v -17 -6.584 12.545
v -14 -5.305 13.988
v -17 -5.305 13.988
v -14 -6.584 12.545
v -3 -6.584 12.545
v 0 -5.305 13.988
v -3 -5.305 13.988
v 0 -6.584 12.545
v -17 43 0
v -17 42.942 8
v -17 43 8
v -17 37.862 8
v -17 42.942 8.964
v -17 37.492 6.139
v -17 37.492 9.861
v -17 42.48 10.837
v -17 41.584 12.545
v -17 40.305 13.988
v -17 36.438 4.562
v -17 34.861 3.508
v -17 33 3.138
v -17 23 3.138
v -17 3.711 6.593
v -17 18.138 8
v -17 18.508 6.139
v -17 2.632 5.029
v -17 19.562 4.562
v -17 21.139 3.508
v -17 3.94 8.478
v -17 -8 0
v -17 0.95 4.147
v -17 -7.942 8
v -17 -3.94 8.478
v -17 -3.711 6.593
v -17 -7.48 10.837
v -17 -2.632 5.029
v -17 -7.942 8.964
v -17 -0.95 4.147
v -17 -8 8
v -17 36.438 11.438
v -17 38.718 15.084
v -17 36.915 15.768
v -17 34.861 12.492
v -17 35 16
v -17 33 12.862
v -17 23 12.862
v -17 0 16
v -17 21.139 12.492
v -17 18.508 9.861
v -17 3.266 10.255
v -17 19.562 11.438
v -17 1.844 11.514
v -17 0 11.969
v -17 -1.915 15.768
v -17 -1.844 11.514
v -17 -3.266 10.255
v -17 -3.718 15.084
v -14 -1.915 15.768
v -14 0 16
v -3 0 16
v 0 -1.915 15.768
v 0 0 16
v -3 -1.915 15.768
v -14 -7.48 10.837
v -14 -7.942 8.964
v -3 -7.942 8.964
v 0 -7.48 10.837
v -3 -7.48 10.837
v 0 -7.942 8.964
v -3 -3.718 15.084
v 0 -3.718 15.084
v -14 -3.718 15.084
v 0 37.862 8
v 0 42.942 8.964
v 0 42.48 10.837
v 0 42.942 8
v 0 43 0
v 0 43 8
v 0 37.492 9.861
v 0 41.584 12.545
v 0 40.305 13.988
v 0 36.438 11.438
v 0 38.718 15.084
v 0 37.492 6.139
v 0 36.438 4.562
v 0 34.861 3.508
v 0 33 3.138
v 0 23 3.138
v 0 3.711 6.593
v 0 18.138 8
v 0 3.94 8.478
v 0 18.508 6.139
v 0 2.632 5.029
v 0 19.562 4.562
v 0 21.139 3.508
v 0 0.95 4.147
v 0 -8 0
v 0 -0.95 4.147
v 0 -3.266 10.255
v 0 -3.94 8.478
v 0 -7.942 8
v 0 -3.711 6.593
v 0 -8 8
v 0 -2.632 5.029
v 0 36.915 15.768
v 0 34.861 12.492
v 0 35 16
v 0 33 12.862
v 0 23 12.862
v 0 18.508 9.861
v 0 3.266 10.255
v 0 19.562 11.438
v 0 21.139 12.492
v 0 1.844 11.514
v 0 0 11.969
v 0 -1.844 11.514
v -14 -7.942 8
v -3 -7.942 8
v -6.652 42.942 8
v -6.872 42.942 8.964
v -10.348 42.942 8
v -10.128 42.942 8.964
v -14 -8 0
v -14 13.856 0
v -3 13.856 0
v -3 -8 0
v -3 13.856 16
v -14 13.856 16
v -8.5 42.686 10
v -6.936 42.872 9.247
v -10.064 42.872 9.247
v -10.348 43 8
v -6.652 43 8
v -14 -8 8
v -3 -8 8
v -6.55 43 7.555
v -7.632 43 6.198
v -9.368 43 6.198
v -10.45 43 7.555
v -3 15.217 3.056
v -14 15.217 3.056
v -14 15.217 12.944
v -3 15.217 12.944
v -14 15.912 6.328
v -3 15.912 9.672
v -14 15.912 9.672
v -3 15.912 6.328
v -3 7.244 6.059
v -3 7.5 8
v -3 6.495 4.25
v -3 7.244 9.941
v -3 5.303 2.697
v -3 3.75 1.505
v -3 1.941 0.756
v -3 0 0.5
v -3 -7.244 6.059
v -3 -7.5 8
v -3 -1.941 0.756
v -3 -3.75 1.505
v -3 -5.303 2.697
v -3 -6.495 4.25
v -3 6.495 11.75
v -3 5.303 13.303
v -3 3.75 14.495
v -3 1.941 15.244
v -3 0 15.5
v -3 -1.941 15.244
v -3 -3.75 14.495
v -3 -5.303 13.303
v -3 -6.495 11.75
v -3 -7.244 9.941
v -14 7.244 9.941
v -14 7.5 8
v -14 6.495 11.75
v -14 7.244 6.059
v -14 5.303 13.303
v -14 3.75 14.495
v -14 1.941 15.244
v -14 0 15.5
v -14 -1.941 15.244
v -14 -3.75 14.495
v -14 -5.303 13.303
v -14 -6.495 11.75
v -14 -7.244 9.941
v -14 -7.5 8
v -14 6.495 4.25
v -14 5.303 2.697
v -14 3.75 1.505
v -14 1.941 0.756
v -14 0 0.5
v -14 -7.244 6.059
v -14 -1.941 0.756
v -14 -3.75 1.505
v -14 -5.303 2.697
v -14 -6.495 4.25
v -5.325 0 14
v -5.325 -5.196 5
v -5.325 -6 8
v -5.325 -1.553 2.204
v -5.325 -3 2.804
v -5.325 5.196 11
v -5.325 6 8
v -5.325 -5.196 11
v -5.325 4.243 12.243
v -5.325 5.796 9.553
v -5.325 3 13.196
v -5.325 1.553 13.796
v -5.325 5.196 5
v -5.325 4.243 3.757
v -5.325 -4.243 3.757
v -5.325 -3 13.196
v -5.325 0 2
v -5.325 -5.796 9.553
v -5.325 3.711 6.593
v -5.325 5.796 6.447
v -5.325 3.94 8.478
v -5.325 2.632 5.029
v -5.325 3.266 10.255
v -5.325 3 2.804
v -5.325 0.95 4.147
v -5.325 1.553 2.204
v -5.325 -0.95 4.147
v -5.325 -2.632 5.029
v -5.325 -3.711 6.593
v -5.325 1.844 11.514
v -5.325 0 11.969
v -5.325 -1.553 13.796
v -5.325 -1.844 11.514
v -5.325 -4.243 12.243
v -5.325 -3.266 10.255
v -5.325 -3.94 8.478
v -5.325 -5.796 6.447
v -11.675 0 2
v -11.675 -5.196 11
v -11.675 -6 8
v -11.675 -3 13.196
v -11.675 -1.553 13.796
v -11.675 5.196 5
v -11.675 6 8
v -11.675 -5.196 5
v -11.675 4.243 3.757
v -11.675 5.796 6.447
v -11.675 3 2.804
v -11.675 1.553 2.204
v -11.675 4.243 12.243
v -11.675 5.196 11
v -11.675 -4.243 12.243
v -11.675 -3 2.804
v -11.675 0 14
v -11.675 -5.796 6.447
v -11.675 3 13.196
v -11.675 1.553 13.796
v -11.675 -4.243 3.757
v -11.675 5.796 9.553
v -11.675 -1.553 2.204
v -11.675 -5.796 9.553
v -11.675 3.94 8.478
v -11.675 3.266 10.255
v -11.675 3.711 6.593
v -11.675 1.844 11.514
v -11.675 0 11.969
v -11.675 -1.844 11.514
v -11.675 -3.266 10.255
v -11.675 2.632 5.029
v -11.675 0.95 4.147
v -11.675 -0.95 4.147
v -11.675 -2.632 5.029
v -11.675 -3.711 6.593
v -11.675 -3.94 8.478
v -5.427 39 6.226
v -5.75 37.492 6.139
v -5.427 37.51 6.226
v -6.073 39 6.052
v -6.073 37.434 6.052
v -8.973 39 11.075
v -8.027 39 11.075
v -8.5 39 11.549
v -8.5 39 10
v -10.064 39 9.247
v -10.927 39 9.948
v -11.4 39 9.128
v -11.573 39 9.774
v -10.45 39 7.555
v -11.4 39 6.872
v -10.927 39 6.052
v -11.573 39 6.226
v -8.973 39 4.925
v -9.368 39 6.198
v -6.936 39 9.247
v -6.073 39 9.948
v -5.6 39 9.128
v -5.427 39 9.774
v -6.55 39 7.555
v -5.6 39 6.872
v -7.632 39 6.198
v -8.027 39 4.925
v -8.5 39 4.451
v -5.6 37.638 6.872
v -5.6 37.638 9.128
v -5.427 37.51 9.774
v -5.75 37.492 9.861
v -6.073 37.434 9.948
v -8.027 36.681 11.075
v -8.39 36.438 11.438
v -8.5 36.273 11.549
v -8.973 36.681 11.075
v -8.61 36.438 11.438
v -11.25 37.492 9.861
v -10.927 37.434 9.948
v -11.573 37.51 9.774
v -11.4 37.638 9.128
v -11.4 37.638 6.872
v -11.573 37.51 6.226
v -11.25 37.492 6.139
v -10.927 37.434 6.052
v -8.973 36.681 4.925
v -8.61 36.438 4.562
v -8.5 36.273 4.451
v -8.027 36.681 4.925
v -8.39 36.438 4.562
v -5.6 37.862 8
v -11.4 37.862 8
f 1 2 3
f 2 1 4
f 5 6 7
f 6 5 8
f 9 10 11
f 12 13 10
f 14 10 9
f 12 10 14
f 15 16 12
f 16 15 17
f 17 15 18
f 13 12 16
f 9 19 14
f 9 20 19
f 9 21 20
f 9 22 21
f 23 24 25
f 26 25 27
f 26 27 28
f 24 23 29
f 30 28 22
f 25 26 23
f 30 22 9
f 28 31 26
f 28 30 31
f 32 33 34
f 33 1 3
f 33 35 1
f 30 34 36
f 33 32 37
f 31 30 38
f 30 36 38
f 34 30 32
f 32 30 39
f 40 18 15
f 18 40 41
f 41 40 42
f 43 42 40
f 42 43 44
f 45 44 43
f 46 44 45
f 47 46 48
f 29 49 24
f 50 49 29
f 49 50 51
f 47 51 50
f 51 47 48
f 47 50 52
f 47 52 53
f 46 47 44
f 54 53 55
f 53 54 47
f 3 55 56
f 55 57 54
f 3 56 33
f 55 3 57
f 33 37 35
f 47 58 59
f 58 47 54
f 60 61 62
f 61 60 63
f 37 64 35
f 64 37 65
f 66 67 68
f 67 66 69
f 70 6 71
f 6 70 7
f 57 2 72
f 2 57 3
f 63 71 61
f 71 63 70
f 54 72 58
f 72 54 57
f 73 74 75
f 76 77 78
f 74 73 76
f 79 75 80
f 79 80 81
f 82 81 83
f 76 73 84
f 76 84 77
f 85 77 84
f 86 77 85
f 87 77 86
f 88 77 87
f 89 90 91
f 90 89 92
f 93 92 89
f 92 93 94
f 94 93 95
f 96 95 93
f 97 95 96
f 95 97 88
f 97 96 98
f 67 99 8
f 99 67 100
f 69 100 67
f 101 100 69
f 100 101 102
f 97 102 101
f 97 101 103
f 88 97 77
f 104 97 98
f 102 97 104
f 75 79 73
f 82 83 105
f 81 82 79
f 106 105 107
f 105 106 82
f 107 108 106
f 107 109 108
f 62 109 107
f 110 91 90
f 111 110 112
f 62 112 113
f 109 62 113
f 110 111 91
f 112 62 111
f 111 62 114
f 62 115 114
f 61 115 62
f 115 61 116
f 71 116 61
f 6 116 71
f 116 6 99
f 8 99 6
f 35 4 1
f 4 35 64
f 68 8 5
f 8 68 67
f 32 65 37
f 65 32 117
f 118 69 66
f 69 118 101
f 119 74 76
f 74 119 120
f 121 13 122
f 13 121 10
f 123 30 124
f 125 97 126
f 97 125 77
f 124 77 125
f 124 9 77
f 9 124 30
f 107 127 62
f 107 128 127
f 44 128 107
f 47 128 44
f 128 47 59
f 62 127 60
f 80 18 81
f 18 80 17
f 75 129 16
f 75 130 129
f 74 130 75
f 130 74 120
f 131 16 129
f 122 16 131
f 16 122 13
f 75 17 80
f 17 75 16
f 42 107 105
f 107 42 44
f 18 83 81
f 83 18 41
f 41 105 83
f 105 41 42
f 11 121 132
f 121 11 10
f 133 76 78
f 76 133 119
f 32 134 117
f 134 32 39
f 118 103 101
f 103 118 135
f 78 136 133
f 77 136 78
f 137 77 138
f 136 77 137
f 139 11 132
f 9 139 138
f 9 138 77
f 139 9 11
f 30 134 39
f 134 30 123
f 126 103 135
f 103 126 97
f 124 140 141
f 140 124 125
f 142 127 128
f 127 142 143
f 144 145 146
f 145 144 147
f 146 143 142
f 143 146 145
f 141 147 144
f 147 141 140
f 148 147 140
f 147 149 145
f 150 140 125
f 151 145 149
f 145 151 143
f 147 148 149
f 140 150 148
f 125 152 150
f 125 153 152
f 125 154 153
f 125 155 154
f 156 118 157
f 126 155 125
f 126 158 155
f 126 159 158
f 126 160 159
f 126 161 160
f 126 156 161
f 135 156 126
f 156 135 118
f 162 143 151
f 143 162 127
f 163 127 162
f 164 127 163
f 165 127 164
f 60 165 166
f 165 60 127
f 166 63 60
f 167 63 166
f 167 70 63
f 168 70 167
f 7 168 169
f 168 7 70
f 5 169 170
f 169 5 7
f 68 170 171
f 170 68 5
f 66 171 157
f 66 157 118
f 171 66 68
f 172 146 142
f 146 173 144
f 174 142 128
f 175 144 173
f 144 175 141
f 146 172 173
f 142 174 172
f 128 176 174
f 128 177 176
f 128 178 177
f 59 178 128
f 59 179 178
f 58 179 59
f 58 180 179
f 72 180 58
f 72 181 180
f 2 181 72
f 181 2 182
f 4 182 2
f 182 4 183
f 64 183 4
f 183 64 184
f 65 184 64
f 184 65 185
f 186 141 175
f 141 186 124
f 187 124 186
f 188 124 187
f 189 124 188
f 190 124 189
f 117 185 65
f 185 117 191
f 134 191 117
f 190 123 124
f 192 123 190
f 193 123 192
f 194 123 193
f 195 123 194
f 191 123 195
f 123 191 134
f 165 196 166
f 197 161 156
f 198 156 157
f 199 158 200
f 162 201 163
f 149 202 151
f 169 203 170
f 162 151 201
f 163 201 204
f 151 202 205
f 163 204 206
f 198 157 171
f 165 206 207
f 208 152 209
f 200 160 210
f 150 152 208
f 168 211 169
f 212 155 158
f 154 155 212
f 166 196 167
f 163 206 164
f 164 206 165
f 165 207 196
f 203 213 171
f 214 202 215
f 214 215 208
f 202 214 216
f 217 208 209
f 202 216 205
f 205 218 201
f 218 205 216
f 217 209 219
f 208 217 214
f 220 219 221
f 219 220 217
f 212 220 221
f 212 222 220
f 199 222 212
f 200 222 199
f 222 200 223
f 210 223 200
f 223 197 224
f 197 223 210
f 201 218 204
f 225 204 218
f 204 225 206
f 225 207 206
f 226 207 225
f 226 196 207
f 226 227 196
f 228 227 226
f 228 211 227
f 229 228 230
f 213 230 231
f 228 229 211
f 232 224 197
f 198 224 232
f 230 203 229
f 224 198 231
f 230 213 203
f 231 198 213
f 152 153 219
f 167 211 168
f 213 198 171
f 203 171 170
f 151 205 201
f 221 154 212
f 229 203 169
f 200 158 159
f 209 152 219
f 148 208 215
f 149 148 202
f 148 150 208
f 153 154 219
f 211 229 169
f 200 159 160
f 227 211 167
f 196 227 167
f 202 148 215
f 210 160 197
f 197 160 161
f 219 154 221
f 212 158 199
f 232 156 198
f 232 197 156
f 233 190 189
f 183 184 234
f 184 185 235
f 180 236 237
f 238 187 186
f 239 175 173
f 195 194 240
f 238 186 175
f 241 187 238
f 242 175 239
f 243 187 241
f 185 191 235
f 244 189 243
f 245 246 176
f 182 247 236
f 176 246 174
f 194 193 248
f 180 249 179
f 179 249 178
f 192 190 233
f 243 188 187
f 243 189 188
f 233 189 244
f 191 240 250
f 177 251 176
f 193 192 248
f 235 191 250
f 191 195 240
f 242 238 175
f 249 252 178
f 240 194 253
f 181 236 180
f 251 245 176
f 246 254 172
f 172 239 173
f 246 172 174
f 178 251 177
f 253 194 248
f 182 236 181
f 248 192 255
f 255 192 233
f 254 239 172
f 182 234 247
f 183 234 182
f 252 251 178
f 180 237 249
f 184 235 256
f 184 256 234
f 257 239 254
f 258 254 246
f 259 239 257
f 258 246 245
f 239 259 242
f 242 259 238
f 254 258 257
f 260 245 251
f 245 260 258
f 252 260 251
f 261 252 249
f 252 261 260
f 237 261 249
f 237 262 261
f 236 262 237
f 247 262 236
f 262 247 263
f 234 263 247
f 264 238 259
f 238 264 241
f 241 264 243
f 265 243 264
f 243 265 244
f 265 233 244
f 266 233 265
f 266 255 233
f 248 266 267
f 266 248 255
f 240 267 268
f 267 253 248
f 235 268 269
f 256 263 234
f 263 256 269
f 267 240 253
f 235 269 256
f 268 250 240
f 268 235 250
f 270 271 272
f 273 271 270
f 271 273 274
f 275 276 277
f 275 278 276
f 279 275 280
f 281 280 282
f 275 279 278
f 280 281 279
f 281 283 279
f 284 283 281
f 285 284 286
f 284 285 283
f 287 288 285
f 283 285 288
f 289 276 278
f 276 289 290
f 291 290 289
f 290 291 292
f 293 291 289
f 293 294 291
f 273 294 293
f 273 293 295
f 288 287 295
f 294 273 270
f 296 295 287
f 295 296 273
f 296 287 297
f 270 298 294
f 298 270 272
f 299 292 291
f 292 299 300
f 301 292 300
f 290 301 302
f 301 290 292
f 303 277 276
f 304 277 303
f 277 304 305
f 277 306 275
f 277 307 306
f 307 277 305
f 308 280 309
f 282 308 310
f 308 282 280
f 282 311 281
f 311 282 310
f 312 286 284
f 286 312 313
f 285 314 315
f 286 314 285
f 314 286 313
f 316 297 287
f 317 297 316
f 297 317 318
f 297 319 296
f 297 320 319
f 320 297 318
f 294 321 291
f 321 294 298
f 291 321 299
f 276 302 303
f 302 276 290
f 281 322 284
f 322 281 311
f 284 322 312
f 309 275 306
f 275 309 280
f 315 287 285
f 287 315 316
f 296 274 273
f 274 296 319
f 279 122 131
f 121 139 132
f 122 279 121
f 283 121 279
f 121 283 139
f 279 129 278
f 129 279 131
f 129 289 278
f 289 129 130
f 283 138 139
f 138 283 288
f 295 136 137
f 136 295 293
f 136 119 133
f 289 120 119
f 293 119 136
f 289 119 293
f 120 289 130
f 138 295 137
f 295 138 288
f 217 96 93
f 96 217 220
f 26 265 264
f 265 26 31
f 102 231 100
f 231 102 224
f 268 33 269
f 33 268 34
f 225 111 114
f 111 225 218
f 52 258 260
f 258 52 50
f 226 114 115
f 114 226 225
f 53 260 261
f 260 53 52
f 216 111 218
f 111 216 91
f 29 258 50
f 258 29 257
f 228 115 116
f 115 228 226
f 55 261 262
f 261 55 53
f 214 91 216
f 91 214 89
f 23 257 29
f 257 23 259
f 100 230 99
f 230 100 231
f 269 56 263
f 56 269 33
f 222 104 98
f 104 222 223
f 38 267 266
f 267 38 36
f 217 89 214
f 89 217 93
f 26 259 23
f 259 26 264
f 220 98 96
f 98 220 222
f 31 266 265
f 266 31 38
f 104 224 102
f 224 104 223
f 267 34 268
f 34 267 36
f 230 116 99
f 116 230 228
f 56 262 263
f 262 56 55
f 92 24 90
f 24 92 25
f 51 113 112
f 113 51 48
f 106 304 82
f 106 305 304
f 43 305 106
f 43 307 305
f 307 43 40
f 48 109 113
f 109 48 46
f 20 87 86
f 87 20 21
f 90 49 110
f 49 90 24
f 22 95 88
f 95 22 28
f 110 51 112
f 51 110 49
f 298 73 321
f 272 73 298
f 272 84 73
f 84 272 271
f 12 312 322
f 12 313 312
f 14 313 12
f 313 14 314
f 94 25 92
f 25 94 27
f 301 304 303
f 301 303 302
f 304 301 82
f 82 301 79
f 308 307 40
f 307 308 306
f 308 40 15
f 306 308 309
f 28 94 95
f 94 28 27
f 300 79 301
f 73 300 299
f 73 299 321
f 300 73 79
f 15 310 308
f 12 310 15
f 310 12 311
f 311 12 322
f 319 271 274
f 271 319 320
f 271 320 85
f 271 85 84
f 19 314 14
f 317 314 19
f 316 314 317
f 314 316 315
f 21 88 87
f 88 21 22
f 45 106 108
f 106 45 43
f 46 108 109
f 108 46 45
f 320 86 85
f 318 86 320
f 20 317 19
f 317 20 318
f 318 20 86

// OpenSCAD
// nelsoncs 2013Jun05 
// modified to support:
// 1. U.S. measurements for y-idler for 3/8 in. rod, 5/16 in. bolt holding 608ZZG bearing
// 2. "fake bearing" was causing problems with two-manifold edges, has been widened to 
// create an overlap with the part
// 
// PRUSA iteration3
// Y idler
// GNU GPL v3
// Josef Průša <iam@josefprusa.cz> and contributors
// http://www.reprap.org/wiki/Prusa_Mendel
// http://prusamendel.org

wall_thickness=3;
opening_width=11;
external_width=opening_width+wall_thickness*2;
opening_diameter = 32;
bearing_width = 6.35; 		// 1/4 in.
bearing_ID = 7.9375; 			// 5/16 in.
rod_diameter = 9.525 + 0.2; 	// 3/8 in. + slack space

tensioner_length = 10;

// increase the elongation if the bearing opening intersects
// with the M10 rod opening.
elongation = 1;


module nut(d,h,horizontal=true){
    cornerdiameter =  (d / 2) / cos (180 / 6);
    cylinder(h = h, r = cornerdiameter, $fn = 6);
    if(horizontal){
        for(i = [1:6]){
			rotate([0,0,60*i]) 
			translate([-cornerdiameter-0.2,0,0]) 
			rotate([0,0,-45]) 
			cube([2,2,h]);
        }
    }
}

module y_idler_base(){

	// bearing end
	translate(v = [0,0,0]) 
	cylinder(h = external_width, r=8);	

	// tensioner end
 	translate(v = [0, 20+2+elongation+2,0]) 
	hull() {
		cylinder(h = external_width, r=8);
		translate([0, tensioner_length,0]) 
		cylinder(h = external_width, r=8);
 	}

	// center
 	translate(v = [0, 10+1+elongation/2+tensioner_length/2+1, external_width/2]) 
	cube(
		size = [16, 22+elongation+tensioner_length+2,external_width], 
		center=true);
 		translate(v = [-4, 10+1+elongation/2+tensioner_length/2+1, external_width/2]) 
		cube(size = [8, 16+22+elongation+tensioner_length+2, external_width], center=true);
}

module y_idler_holes(){

	// bearing center hole
 	translate(v = [0,0,-1]) cylinder(h = 25, r=bearing_ID/2);

 	difference() {
   		translate(v = [0, 0, wall_thickness]) 
		cylinder(h = opening_width, r=opening_diameter/2);

   		// The fake bearing
   		%translate([0, 0, (external_width/2)-(bearing_width/2)-0.5]) 
		cylinder(h = bearing_width+1, r=(22/2)+2*0.66);

   		// The two bumps around the center of the bearing
   		translate([0,0,wall_thickness]) 
		cylinder(r1=15/2, r2=12/2, h=opening_width/2-bearing_width/2);

   		translate([0,0,external_width-wall_thickness]) 
		rotate([0,180,0]) 
		cylinder(r1=15/2, r2=12/2, h=opening_width/2-bearing_width/2);
 	}

	// rod slot (hull)
 	translate(v = [0, 20+2+elongation, -1]) 
	hull() {
		cylinder(h = 25, r=rod_diameter/2);
		
		translate([0, tensioner_length, 0]) 
		cylinder(h = 25, r=rod_diameter/2);
 	}
	
	// tensioner bolt and nut
 	translate([0, 16+22+elongation+tensioner_length+2-12, external_width/2]) 
	rotate([90, 0, 0]) {
		nut(5.8, 5);
		translate([0, 0, -5]) cylinder(r=2, h=10);
 	}
}

// Final part
module y_idler(){
 	translate(v = [0, 0, 8])
	rotate([0, -90, 0]) difference(){
  		y_idler_base();
  		y_idler_holes();
 	}
}

y_idler();
